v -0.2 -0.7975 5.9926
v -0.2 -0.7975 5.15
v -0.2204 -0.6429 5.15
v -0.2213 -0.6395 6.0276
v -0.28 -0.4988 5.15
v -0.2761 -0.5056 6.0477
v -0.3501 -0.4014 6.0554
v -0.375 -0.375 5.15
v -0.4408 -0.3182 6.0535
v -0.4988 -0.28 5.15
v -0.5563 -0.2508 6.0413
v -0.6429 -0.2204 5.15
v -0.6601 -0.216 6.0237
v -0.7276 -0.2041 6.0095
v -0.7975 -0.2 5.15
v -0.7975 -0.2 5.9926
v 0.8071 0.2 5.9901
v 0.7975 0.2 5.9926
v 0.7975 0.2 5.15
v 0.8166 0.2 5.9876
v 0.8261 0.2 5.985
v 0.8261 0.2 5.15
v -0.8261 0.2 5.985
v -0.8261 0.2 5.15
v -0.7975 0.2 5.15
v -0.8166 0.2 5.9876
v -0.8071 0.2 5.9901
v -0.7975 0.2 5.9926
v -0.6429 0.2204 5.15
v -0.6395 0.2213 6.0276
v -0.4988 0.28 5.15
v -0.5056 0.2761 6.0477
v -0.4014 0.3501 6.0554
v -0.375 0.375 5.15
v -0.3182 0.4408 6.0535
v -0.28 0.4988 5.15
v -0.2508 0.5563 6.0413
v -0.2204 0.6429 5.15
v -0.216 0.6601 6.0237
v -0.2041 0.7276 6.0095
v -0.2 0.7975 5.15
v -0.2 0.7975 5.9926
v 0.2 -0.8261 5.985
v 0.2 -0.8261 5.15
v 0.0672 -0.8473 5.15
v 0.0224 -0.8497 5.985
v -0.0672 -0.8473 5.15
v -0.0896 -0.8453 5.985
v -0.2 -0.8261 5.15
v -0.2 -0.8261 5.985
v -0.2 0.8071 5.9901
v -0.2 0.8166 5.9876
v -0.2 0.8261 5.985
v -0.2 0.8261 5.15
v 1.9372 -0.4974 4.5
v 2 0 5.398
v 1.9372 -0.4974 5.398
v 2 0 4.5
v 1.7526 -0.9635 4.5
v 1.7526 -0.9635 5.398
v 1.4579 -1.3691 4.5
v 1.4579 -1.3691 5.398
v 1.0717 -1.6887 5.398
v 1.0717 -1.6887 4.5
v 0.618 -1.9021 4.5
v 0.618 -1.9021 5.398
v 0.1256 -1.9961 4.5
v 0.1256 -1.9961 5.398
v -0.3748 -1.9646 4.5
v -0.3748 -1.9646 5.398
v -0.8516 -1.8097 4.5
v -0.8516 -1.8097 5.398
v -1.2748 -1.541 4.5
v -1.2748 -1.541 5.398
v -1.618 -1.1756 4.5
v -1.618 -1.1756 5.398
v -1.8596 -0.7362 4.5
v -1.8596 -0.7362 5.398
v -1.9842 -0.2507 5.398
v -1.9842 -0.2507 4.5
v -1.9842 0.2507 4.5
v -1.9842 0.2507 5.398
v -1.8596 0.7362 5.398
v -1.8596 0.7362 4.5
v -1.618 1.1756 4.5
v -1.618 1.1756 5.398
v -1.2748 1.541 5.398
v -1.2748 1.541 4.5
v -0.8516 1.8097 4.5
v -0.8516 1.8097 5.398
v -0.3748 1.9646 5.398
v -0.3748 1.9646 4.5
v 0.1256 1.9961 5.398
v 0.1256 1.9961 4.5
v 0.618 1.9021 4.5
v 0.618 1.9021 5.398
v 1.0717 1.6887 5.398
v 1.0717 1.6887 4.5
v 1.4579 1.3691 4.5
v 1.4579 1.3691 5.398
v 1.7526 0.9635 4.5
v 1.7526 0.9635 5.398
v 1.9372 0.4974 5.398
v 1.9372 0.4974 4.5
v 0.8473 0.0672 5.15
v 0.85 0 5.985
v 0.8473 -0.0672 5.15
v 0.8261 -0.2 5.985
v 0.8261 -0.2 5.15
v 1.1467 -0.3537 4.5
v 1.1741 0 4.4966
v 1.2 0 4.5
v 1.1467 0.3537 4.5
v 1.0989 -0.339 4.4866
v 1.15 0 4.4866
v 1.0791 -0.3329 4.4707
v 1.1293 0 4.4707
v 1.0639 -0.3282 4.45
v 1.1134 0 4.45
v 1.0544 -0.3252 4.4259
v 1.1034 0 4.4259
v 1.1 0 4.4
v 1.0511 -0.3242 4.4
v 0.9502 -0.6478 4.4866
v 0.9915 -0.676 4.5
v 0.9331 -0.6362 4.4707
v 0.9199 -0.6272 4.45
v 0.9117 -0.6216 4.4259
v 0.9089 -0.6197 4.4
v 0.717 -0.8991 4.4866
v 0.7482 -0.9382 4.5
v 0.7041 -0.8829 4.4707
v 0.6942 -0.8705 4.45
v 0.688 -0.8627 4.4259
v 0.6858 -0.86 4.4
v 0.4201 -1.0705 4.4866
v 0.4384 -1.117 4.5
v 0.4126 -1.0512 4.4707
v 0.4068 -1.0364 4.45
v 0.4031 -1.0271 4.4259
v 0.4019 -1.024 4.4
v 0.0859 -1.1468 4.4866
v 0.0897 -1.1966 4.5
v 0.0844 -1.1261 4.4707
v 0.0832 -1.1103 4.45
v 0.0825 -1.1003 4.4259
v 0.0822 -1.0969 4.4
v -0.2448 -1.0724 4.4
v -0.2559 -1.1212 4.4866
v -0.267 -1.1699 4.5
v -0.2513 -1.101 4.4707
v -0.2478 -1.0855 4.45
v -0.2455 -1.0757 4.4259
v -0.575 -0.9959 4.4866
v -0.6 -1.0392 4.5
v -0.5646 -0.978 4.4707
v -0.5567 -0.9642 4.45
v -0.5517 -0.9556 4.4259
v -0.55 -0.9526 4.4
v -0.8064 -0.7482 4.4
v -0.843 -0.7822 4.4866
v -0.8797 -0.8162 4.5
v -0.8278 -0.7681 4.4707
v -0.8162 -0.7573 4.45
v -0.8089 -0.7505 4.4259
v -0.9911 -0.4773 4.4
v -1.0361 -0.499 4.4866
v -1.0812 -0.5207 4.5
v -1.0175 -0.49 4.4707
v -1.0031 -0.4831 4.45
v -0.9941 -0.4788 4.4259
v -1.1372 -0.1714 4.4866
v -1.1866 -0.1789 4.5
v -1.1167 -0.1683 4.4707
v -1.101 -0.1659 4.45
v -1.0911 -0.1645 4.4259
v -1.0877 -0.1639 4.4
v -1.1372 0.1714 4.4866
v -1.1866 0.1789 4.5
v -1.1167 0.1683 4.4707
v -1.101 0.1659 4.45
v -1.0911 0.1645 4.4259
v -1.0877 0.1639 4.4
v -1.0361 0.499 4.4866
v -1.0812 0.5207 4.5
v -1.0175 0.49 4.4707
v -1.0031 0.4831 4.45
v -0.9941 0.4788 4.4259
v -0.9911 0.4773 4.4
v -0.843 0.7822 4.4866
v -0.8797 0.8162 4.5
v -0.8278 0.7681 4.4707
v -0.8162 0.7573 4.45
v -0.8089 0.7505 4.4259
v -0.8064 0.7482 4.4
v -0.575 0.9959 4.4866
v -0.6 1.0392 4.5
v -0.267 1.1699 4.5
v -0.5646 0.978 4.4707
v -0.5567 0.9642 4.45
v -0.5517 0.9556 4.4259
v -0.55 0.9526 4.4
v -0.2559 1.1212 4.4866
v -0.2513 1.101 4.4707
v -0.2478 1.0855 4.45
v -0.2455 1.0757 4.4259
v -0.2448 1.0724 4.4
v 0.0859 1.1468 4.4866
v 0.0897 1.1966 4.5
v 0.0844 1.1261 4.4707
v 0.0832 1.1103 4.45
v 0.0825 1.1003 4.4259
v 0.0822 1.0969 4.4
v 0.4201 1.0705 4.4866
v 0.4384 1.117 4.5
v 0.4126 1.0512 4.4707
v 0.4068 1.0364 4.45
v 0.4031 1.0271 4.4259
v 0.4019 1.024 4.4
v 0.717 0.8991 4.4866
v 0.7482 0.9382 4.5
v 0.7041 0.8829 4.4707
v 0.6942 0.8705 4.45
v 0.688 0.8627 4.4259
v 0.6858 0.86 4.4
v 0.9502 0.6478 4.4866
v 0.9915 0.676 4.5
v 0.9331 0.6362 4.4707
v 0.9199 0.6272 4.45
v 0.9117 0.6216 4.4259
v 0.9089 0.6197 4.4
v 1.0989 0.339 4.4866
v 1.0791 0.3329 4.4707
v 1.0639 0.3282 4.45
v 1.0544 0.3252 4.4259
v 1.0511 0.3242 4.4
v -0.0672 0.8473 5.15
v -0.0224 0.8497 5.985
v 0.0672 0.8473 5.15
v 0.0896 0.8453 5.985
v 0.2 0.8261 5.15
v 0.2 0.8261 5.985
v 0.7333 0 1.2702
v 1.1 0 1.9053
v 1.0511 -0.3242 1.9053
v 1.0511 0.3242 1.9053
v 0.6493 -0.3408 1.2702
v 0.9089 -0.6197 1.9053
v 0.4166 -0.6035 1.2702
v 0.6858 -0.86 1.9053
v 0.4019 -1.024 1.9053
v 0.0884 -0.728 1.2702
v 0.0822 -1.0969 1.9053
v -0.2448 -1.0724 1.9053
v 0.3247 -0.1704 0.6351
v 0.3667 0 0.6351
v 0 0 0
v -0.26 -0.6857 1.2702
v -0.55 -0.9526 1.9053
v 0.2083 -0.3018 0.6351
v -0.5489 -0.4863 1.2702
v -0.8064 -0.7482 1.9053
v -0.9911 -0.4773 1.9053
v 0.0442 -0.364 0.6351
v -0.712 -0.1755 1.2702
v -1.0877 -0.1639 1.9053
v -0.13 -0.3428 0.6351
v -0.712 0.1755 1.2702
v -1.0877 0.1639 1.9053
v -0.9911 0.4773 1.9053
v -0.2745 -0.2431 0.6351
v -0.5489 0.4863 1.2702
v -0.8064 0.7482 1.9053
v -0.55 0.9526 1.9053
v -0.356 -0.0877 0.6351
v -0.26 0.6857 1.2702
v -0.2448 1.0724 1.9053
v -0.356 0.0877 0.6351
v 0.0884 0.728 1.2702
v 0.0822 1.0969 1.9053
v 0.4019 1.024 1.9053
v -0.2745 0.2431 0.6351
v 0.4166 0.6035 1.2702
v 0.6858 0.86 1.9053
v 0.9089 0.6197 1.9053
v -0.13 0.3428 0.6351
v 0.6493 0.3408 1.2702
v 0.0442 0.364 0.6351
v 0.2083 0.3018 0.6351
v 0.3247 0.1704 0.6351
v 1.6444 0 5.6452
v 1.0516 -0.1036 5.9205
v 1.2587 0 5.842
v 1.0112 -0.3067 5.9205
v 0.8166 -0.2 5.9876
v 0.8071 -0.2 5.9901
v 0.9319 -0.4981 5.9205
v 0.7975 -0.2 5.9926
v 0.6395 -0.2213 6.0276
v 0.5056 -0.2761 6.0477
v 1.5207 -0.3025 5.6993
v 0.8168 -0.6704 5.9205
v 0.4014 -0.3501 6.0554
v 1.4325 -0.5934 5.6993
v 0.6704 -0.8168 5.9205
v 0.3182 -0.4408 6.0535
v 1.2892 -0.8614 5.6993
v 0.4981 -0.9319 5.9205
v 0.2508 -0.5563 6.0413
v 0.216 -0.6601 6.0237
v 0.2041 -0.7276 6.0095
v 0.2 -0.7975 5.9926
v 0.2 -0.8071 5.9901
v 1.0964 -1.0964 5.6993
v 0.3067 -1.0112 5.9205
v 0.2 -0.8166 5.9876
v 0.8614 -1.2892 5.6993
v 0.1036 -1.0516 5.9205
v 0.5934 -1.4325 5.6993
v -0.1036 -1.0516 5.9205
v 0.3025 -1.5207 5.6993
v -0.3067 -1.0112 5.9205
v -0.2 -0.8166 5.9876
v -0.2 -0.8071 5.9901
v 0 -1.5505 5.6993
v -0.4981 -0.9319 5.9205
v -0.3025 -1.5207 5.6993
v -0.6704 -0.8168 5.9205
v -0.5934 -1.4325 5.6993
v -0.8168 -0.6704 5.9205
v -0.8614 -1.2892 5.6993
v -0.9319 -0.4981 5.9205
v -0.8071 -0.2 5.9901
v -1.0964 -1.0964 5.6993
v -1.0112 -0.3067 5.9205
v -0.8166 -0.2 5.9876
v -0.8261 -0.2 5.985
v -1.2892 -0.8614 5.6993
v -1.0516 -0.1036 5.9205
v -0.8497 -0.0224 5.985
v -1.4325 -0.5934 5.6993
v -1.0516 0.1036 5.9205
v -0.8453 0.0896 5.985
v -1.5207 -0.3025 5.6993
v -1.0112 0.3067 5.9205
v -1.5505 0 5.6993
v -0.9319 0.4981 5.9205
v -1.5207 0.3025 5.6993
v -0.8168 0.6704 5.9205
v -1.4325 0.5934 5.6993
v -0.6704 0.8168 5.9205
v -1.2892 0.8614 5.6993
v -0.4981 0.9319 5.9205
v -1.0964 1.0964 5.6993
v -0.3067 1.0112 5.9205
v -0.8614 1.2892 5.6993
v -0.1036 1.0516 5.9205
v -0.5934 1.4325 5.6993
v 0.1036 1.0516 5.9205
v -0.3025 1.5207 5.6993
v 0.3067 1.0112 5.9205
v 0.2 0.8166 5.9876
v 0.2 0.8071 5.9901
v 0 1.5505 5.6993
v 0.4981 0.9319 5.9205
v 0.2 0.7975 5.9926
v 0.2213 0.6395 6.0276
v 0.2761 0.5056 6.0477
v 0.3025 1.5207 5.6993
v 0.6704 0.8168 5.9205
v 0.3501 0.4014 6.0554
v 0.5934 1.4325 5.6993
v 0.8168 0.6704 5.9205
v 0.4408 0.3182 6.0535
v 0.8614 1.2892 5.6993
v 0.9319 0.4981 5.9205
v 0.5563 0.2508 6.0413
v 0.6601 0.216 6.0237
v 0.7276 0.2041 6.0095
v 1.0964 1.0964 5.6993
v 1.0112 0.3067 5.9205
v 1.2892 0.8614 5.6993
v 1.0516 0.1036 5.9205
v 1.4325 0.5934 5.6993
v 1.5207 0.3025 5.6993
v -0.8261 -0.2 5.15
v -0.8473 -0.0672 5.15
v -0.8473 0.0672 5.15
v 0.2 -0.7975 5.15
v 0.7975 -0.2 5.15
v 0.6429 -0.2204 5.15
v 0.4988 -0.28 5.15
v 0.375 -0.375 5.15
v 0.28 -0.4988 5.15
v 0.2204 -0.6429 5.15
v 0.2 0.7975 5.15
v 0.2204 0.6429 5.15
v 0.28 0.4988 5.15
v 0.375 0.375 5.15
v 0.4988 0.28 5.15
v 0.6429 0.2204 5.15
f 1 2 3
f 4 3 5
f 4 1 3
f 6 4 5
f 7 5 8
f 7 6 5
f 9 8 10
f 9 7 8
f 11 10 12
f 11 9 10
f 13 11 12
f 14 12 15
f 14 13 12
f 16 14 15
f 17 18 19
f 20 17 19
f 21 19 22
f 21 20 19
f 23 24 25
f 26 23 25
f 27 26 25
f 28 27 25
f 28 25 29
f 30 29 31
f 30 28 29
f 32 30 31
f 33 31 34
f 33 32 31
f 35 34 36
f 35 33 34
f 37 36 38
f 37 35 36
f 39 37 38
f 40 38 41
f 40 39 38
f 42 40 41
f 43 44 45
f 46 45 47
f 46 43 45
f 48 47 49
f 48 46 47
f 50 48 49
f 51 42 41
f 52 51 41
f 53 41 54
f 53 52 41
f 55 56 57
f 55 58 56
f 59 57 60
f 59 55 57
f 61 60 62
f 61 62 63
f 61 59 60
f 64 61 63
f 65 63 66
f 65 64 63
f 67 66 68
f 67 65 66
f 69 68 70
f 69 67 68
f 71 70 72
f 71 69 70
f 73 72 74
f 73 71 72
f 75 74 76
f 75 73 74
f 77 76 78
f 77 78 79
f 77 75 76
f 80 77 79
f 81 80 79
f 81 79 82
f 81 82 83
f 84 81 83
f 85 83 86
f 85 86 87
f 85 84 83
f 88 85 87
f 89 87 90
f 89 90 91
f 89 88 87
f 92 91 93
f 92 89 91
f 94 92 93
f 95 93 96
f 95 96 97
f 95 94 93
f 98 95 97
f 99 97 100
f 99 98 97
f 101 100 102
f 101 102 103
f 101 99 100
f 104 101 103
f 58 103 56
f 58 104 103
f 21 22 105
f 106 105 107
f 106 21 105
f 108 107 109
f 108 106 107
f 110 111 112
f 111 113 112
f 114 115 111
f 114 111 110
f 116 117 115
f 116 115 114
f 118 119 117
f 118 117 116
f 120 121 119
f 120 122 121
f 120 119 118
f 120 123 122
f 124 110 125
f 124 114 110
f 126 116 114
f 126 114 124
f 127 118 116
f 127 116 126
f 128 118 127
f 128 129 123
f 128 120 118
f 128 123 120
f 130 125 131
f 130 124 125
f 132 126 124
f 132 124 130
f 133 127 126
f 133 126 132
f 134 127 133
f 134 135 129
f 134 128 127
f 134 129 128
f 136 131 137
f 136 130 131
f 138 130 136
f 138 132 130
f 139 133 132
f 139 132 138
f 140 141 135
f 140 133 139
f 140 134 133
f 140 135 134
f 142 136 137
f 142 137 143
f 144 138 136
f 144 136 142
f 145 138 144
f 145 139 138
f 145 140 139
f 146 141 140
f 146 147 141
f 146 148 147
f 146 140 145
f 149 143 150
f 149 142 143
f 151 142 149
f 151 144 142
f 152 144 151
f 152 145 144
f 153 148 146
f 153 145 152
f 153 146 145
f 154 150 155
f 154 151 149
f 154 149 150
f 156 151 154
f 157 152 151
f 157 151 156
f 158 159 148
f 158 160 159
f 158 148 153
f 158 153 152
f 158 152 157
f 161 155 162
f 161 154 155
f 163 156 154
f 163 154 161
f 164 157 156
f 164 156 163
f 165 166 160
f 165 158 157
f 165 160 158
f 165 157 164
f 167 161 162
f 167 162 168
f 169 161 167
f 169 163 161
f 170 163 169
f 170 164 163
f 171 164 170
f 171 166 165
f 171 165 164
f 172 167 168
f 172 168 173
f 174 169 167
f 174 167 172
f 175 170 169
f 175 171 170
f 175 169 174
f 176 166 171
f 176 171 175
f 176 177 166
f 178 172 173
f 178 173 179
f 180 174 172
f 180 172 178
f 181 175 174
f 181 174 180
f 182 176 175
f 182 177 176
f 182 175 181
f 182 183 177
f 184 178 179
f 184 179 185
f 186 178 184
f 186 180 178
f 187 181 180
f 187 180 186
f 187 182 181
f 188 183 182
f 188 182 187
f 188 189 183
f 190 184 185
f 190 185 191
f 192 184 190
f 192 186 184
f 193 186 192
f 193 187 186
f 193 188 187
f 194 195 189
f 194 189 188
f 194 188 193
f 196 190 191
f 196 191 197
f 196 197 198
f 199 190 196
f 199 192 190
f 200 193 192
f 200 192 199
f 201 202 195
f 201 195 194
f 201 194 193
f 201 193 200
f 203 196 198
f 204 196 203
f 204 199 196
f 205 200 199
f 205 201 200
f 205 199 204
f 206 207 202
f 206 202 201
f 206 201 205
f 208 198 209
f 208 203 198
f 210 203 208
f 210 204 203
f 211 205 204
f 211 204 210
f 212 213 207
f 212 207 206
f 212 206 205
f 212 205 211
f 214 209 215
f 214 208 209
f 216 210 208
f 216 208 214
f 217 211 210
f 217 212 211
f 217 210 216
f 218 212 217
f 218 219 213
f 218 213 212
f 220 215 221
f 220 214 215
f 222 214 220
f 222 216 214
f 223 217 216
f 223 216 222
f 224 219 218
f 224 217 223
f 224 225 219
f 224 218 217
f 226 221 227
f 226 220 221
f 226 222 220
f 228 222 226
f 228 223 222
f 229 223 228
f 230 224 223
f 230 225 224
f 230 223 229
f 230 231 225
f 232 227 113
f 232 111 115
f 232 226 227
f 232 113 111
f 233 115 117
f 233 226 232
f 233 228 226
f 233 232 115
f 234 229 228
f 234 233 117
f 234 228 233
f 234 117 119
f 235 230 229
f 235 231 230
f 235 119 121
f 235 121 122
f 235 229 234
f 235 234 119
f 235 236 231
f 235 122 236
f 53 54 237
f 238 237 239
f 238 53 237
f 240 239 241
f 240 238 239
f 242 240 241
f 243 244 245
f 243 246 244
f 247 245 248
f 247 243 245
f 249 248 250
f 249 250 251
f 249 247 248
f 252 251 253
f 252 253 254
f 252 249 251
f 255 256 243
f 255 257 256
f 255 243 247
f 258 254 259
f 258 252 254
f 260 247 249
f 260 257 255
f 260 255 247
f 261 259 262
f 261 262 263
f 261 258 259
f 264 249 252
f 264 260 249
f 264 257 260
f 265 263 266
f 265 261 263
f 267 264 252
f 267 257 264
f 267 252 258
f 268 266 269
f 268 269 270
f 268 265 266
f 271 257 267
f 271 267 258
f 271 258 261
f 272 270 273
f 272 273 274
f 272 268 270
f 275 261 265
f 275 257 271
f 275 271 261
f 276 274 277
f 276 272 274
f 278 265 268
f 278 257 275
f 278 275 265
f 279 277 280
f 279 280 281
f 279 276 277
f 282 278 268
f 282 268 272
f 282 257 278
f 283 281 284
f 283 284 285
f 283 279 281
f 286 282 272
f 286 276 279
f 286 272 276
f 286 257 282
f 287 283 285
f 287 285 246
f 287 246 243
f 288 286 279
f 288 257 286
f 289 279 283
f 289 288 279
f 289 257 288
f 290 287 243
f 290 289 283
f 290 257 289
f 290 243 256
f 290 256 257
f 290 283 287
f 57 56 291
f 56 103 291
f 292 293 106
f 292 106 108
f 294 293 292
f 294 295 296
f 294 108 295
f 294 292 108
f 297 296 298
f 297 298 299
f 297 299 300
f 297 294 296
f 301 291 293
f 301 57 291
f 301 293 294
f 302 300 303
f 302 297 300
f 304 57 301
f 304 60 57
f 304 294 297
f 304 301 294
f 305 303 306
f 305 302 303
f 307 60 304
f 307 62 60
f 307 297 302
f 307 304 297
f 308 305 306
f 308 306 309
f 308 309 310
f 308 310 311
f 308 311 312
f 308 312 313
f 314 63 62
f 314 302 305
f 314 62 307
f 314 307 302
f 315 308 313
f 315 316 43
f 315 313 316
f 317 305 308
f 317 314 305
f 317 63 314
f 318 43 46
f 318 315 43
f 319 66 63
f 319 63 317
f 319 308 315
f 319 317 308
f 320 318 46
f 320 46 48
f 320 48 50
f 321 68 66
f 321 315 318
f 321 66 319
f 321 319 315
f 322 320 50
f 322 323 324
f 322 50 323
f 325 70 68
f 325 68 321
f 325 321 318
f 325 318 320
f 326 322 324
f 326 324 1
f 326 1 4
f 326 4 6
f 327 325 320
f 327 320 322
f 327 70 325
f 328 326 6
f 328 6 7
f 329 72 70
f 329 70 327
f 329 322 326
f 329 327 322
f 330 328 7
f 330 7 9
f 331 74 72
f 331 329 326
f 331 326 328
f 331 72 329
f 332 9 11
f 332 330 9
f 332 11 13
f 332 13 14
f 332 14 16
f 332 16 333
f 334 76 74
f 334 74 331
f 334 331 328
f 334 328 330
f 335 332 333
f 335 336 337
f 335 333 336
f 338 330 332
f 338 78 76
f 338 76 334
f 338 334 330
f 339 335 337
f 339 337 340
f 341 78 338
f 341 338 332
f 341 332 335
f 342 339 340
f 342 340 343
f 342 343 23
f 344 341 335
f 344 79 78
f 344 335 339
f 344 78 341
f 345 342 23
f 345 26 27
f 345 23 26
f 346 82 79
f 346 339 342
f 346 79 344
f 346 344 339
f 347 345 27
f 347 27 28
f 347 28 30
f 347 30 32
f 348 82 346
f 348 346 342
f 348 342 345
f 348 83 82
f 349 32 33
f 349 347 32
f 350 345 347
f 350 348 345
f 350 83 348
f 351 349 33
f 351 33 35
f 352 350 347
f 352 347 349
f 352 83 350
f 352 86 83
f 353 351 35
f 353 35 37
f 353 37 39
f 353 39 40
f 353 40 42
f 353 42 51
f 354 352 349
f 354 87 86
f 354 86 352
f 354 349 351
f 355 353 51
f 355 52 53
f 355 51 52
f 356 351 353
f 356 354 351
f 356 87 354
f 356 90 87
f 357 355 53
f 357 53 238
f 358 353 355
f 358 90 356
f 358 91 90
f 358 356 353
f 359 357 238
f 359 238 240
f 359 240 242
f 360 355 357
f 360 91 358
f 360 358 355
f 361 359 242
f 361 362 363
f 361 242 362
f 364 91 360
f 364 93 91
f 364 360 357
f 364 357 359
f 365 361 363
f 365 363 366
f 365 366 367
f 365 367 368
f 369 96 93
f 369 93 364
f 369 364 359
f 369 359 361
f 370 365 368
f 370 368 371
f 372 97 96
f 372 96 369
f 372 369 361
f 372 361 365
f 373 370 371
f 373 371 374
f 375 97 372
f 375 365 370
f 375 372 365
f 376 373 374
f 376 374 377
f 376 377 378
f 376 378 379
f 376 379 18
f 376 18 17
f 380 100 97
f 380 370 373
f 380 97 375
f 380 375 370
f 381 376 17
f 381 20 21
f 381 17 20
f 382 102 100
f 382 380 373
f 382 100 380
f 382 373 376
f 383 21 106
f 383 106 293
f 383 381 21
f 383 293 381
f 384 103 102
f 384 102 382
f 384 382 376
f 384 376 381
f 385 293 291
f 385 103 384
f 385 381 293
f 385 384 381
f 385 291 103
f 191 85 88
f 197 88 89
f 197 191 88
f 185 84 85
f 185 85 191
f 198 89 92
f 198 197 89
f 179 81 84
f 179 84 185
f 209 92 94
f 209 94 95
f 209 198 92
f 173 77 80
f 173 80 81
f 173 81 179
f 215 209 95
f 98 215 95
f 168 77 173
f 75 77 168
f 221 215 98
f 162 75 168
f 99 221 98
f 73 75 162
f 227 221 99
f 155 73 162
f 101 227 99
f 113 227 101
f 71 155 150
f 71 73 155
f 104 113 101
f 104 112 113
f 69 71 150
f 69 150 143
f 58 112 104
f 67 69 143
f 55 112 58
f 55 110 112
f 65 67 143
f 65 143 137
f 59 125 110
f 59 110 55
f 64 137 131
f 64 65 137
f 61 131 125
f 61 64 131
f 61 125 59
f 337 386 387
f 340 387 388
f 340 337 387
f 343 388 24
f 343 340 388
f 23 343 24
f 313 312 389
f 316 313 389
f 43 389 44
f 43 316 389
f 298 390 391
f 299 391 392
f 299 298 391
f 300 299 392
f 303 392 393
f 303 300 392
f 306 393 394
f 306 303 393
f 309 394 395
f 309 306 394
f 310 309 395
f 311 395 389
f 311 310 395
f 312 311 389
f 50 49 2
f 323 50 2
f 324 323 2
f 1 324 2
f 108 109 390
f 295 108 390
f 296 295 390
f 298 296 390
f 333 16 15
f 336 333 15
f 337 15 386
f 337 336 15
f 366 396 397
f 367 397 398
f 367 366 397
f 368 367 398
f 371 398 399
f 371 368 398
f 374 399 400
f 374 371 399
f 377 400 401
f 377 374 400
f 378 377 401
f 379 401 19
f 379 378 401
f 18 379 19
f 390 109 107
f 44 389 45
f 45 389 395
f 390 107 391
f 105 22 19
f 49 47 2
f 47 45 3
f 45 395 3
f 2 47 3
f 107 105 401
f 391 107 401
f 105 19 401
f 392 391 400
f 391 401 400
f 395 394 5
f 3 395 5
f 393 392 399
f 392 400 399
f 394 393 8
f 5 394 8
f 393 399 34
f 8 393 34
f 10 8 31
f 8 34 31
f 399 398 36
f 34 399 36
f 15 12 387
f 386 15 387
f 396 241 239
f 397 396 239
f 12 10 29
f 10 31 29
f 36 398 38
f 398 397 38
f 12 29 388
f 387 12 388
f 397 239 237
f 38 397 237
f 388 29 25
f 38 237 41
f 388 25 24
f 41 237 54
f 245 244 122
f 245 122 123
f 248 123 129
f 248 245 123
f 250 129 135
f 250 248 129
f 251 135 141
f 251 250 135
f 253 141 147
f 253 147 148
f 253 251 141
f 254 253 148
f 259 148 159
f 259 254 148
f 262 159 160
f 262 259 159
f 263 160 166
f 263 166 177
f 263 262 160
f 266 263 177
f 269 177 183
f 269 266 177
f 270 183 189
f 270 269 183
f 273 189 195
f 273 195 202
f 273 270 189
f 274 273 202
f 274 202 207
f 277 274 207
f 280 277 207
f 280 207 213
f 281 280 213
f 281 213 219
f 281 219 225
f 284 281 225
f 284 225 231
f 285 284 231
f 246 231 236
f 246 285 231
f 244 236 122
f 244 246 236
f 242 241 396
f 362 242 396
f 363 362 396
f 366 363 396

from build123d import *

# Parameters (mm, degrees)
CUT_EXTRUDE_2_DEPTH = 0.95
FILLET_1_R          = 0.1


with BuildPart() as part:
    # 草图8 → Revolve 1380 (revolve)
    with BuildSketch(Plane(origin=(0, 0, 0), x_dir=(0, 0, -1), z_dir=(1, 0, 0)), mode=Mode.PRIVATE) as revolve_1380_sk:
        with BuildLine():
            Line((0, 0), (-6.1, 0))
            ThreePointArc((-6.1, 0), (-5.919403703, 1.059811908), (-5.397999199, 2))
            Line((-5.397999199, 2), (-4.5, 2))
            Line((-4.5, 2), (-4.5, 1.1))
            Line((-4.5, 1.1), (-1.905255888, 1.1))
            Line((-1.905255888, 1.1), (0, 0))
        make_face()
    revolve(revolve_1380_sk.sketch.rotate(Axis((0, 0, 11.71), (0, 0, -1)), 90), axis=Axis((0, 0, 11.71), (0, 0, -1)))

    # 草图7 → 切除-拉伸2 (cut)
    with BuildSketch(Plane.XY.offset(6.1)):
        with BuildLine():
            Line((0.2, 0.826135582), (0.2, 0.797500009))
            ThreePointArc((0.2, 0.797500009), (0.375003701, 0.375003701), (0.797500009, 0.2))
            Line((0.797500009, 0.2), (0.826135582, 0.2))
            ThreePointArc((0.826135582, 0.2), (0.85, 0), (0.826135582, -0.2))
            Line((0.826135582, -0.2), (0.797500009, -0.2))
            ThreePointArc((0.797500009, -0.2), (0.375003701, -0.375003701), (0.2, -0.797500009))
            Line((0.2, -0.797500009), (0.2, -0.826135582))
            ThreePointArc((0.2, -0.826135582), (0, -0.85), (-0.2, -0.826135582))
            Line((-0.2, -0.826135582), (-0.2, -0.797500009))
            ThreePointArc((-0.2, -0.797500009), (-0.375003701, -0.375003701), (-0.797500009, -0.2))
            Line((-0.797500009, -0.2), (-0.826135582, -0.2))
            ThreePointArc((-0.826135582, -0.2), (-0.85, 0), (-0.826135582, 0.2))
            Line((-0.826135582, 0.2), (-0.797500009, 0.2))
            ThreePointArc((-0.797500009, 0.2), (-0.375003701, 0.375003701), (-0.2, 0.797500009))
            Line((-0.2, 0.797500009), (-0.2, 0.826135582))
            ThreePointArc((-0.2, 0.826135582), (0, 0.85), (0.2, 0.826135582))
        make_face()
    extrude(amount=-CUT_EXTRUDE_2_DEPTH, mode=Mode.SUBTRACT)

    # 圆角1
    fillet_1_edges = [part.edges().sort_by_distance(p)[0] for p in [
        (-1.1, 0, 4.5),
    ]]
    fillet(fillet_1_edges, radius=FILLET_1_R)


solid = part.part
